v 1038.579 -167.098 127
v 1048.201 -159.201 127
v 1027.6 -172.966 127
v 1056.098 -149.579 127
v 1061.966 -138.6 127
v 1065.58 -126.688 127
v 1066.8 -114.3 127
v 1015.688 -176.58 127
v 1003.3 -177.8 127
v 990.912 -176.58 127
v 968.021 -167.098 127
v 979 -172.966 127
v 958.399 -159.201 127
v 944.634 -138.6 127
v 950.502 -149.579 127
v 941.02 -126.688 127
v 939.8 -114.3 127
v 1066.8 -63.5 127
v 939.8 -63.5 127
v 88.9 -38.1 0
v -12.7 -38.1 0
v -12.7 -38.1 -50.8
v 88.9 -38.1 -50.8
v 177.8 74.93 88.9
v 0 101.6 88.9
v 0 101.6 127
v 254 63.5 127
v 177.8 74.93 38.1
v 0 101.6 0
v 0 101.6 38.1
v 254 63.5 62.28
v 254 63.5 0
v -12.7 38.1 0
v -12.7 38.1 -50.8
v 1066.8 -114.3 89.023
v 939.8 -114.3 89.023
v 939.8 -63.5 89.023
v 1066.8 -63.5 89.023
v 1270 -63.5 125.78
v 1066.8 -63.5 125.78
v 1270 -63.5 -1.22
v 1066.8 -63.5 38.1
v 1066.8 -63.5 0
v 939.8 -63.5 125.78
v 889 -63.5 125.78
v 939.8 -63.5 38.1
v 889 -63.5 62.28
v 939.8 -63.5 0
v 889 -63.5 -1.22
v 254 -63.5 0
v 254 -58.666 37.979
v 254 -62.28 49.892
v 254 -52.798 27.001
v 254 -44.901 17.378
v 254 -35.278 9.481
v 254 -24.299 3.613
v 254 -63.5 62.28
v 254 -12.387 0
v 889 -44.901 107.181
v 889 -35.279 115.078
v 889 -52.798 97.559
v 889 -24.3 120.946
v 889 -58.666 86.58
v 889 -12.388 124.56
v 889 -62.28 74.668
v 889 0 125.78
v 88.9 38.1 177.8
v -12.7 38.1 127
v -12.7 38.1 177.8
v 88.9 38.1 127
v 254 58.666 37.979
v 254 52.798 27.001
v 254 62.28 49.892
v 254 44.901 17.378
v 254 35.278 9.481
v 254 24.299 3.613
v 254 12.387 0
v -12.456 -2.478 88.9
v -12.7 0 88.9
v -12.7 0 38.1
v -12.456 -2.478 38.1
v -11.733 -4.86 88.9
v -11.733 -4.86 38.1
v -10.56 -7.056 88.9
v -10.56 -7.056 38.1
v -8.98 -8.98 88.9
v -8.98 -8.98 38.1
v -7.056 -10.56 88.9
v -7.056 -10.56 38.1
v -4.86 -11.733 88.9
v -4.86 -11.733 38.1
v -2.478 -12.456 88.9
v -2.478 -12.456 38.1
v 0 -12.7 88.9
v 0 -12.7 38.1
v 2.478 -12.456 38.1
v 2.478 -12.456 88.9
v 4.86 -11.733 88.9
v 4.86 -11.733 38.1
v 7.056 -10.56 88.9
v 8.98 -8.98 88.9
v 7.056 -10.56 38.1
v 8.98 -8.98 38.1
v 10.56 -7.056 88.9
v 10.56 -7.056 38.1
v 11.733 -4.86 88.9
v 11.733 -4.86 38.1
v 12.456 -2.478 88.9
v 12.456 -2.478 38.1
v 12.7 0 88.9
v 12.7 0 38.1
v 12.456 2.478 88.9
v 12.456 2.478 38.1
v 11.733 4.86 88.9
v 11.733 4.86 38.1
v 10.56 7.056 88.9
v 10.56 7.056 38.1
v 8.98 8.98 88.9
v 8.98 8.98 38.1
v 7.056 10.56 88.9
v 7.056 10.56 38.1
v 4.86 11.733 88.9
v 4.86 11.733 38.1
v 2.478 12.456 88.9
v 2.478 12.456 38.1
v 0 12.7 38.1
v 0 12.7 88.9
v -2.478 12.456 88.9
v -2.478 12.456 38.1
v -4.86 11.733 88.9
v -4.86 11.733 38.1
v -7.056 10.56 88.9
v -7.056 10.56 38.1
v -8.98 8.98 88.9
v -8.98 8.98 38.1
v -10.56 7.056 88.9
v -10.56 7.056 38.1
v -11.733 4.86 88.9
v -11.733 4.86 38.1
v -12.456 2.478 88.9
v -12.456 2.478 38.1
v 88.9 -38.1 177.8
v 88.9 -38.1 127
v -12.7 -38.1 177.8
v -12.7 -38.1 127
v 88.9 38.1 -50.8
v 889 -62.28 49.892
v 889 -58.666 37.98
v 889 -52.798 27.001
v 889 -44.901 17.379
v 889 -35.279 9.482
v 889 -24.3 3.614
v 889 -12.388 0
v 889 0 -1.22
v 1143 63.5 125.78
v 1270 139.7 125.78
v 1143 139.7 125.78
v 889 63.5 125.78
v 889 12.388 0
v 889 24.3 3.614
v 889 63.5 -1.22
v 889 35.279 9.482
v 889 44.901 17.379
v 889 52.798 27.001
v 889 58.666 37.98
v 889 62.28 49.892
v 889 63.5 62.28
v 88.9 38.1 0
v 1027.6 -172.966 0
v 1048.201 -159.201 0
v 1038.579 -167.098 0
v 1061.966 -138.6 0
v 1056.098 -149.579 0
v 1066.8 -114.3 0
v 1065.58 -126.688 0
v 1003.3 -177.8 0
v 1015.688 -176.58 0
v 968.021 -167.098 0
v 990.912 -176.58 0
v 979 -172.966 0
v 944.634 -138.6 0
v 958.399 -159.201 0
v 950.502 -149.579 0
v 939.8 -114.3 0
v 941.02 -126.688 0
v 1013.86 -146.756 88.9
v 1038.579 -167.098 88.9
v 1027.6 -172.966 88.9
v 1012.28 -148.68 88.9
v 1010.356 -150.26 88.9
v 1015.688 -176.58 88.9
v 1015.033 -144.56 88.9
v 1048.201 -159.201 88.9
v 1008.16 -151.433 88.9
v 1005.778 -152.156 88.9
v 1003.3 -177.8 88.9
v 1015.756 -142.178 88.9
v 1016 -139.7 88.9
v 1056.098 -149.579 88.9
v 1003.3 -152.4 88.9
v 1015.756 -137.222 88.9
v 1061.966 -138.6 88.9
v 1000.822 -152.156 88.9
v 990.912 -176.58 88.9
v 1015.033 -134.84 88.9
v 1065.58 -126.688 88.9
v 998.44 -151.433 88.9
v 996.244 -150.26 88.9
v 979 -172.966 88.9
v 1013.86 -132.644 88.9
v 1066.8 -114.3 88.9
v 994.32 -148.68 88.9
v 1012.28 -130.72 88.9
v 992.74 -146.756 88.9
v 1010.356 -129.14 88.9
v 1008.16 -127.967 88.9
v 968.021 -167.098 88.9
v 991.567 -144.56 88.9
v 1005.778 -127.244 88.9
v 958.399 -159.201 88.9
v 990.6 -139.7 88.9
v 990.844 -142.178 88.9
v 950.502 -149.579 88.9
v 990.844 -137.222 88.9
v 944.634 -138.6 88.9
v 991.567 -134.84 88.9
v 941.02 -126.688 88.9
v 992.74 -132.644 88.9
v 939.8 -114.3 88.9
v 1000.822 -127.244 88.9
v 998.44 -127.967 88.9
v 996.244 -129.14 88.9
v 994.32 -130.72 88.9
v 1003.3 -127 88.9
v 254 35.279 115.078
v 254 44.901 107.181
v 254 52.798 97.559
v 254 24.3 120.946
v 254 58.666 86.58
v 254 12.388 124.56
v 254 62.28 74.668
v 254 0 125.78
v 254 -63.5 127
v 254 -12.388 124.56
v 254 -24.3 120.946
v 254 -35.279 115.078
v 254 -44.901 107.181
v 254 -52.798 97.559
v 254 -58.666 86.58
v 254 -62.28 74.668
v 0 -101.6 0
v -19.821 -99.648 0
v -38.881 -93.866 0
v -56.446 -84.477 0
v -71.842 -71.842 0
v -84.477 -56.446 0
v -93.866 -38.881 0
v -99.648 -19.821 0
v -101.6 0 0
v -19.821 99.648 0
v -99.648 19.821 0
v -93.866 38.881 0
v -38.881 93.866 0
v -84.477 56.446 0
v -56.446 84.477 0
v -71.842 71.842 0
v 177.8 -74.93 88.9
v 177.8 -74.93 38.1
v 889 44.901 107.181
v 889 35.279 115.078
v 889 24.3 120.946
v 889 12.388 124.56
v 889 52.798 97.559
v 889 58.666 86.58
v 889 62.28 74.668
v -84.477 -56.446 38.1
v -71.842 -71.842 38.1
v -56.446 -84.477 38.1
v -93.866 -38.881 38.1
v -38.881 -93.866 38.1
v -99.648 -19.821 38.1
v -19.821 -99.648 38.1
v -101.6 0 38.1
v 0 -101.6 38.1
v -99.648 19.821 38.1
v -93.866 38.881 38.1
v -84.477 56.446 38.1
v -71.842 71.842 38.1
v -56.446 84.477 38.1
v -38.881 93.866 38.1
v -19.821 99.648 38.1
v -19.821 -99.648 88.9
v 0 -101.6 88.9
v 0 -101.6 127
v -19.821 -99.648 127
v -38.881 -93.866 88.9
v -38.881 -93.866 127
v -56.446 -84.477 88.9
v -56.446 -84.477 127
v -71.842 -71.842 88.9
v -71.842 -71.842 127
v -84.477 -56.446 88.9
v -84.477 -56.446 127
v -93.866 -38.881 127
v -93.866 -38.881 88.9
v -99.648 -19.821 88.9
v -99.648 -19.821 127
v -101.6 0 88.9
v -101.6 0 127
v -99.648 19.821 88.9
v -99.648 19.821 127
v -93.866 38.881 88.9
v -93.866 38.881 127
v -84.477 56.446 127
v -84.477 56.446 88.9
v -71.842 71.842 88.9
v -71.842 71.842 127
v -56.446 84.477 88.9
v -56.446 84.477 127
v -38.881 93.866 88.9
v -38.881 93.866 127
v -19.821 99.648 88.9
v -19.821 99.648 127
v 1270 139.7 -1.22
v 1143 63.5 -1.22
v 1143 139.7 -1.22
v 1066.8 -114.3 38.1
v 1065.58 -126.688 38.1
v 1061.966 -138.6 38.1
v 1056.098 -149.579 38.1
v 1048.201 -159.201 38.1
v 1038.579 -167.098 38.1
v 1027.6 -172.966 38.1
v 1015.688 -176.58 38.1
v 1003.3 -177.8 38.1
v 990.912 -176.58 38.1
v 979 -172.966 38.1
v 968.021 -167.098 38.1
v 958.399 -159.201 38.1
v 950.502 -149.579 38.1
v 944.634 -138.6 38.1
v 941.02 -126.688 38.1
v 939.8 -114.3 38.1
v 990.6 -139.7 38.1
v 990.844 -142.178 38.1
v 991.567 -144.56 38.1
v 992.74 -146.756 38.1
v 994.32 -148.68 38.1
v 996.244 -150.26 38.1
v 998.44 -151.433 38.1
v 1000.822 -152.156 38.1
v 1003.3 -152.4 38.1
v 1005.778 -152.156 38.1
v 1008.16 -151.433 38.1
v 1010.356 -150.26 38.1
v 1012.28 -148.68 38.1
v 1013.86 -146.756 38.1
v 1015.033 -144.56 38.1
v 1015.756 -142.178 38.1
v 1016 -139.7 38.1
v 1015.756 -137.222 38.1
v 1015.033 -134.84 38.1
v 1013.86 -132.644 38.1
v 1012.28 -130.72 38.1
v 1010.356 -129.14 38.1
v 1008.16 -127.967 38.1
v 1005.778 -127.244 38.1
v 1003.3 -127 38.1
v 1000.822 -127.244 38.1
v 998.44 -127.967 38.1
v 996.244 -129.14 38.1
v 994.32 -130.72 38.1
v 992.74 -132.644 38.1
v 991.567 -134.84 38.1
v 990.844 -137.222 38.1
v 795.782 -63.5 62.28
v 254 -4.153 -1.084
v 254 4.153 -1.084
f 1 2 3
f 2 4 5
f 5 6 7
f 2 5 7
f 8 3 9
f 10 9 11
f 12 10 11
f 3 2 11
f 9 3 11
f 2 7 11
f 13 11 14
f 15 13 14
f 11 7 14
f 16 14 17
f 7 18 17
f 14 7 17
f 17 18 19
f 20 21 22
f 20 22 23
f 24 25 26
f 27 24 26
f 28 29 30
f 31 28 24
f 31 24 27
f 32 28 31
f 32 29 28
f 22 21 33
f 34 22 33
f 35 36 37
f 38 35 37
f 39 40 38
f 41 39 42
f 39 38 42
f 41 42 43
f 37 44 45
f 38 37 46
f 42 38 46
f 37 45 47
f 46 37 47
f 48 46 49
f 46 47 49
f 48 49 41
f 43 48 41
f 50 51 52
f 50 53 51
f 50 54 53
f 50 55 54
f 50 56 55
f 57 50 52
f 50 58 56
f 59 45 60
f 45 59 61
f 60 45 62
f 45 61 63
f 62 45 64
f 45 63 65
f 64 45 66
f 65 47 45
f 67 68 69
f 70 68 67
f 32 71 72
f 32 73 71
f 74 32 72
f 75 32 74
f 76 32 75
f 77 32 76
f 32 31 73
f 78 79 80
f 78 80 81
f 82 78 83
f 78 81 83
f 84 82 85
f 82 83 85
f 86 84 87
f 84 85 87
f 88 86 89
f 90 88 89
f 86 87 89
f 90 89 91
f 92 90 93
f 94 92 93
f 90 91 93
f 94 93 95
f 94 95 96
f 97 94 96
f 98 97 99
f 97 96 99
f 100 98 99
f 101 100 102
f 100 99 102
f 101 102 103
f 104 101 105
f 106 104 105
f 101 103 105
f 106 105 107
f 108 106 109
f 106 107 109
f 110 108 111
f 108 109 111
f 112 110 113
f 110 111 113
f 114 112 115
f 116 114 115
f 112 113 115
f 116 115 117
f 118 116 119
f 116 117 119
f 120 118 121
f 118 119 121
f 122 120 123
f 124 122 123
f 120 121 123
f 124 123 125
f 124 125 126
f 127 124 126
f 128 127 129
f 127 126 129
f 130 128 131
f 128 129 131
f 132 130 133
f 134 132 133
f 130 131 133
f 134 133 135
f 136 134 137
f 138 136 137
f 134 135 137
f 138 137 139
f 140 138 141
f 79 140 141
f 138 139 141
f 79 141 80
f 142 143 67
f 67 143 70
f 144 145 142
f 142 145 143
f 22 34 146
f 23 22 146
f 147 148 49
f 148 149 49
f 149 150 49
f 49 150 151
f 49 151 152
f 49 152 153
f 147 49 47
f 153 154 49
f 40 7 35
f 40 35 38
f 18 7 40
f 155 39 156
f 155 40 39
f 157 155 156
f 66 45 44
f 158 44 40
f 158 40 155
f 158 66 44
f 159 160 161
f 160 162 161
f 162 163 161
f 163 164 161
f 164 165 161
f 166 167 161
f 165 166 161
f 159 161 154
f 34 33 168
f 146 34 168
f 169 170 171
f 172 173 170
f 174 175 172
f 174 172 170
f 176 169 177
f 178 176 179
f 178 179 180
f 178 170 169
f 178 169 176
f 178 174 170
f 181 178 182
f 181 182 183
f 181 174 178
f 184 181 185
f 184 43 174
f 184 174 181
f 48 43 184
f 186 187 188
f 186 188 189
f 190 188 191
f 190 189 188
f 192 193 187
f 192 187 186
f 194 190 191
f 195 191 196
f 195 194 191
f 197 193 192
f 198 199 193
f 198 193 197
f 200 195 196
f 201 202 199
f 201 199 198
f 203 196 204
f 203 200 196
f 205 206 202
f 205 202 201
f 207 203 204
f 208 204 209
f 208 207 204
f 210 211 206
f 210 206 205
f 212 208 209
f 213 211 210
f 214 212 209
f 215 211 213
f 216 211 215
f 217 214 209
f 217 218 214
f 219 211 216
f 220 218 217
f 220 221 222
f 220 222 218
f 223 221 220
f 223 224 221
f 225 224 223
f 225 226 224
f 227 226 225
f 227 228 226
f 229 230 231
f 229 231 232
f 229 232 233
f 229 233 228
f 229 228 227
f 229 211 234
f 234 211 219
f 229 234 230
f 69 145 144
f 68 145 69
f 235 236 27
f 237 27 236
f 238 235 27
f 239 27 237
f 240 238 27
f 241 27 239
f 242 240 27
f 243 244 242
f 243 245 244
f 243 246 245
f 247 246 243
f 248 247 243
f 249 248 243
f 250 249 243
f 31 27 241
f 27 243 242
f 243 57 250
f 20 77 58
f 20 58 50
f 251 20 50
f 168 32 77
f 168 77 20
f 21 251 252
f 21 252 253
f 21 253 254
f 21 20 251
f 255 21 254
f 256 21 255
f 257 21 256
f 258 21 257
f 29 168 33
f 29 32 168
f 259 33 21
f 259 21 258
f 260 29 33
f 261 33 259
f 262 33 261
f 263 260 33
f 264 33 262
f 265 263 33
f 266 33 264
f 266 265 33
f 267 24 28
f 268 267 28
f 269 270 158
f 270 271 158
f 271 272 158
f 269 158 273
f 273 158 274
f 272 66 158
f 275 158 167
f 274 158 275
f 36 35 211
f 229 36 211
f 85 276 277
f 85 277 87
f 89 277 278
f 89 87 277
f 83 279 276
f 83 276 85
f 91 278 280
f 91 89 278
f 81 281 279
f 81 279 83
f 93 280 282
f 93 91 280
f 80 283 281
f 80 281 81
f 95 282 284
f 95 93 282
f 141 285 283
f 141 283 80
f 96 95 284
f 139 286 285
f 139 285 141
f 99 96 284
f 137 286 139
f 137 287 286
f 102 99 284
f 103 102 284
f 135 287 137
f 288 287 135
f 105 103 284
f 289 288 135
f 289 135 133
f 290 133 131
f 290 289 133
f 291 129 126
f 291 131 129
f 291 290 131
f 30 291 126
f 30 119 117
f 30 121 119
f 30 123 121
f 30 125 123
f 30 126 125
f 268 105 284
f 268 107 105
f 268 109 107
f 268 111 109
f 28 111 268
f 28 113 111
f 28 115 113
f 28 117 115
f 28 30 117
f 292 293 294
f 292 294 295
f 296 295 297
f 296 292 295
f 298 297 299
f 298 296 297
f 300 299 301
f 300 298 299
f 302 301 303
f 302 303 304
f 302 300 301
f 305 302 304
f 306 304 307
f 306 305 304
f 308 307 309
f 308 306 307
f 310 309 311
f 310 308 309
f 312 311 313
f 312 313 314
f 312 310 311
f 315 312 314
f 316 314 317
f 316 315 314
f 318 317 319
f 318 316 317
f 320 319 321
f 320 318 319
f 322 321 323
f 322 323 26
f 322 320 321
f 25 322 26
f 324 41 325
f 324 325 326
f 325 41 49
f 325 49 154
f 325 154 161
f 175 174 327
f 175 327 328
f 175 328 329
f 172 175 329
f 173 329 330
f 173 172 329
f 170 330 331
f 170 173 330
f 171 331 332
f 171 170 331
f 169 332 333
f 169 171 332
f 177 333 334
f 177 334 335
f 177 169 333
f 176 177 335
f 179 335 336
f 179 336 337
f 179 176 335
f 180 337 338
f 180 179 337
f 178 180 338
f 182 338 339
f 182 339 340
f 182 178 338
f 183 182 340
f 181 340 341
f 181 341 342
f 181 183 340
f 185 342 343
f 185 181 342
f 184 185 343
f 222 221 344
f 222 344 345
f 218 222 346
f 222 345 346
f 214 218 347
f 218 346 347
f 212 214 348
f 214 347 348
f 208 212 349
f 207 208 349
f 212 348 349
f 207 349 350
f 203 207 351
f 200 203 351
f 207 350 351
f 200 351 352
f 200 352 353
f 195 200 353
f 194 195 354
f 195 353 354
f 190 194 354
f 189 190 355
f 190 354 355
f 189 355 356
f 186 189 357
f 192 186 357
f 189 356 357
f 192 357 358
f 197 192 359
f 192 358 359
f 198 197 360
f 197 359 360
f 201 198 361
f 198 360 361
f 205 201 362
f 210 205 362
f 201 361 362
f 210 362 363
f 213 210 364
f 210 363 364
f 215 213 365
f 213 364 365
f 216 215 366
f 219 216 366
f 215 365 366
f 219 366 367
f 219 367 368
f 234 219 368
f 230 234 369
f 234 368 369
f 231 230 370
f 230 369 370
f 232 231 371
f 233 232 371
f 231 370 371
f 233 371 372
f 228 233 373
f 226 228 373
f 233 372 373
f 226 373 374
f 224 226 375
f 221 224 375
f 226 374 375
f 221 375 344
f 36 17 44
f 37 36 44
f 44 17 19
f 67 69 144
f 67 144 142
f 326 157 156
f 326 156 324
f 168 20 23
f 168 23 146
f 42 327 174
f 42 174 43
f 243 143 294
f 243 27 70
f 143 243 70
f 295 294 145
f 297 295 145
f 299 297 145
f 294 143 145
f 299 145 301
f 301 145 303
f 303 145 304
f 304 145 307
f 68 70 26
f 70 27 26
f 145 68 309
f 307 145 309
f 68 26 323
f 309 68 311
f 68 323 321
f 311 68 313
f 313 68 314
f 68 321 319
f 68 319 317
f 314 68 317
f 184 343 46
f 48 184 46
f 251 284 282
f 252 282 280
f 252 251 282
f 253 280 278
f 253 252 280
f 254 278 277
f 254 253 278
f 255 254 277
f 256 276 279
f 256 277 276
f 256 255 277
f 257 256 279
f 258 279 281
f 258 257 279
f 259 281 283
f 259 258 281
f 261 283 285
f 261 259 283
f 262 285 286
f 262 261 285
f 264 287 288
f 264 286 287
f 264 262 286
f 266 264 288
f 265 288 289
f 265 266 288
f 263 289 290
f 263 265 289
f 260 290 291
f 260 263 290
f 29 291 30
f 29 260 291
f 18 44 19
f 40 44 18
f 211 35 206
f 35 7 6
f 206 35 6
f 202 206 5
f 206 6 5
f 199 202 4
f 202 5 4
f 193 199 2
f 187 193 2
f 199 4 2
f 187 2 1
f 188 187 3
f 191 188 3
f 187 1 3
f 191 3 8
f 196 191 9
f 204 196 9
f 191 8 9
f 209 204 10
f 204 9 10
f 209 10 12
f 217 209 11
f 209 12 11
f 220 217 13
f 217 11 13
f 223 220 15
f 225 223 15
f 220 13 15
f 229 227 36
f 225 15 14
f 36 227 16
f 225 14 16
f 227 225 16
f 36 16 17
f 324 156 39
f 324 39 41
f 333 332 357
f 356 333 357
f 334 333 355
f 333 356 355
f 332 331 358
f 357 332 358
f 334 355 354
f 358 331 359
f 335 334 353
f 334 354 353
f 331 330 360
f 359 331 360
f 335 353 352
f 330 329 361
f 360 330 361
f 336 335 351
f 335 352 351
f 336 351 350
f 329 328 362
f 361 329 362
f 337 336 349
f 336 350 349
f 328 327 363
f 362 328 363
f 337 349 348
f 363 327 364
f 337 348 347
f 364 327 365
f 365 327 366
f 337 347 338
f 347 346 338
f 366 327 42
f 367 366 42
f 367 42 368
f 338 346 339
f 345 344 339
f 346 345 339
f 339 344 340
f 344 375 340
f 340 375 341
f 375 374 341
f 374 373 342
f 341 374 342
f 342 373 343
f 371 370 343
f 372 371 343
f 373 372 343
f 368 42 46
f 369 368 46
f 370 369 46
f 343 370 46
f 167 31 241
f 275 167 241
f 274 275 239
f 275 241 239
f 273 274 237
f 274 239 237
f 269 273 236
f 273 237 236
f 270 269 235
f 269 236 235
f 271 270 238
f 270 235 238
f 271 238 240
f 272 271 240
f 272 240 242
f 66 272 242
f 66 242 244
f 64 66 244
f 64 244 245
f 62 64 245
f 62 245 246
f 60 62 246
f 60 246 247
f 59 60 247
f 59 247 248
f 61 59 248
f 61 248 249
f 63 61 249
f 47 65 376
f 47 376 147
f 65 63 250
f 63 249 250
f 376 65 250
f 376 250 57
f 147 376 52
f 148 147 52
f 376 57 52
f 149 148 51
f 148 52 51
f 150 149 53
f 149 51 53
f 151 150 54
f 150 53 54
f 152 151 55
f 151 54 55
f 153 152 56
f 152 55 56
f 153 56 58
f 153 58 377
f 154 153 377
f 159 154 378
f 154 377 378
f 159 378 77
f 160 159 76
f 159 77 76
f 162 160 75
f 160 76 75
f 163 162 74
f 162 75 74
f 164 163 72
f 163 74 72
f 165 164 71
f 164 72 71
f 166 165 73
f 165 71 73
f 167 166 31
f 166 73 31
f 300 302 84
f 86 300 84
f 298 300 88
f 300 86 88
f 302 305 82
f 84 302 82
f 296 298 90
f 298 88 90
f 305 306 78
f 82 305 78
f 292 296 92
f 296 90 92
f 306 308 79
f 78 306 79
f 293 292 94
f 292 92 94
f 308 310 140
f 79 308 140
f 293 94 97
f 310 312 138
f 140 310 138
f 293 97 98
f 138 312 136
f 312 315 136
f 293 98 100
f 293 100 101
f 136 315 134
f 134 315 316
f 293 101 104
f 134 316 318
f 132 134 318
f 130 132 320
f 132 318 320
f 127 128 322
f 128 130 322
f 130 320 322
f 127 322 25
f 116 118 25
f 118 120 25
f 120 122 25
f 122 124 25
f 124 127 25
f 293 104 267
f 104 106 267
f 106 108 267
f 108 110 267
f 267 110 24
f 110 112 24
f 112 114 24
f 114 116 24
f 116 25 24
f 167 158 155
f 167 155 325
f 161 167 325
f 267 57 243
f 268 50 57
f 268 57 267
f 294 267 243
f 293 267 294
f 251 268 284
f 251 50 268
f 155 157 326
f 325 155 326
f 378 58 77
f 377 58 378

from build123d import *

# Parameters (mm, degrees)
BOSS_EXTRUDE2_DEPTH  = 127
SKETCH11_W           = 279.4
SKETCH11_H           = 50.8
CUT_EXTRUDE1_DEPTH   = 350.192267956
SKETCH12_R           = 63.5
BOSS_EXTRUDE3_DEPTH  = 635
SKETCH13_W           = 101.6
SKETCH13_H           = 76.2
BOSS_EXTRUDE4_DEPTH  = 50.8
SKETCH14_W           = 127
SKETCH14_H           = 127
BOSS_EXTRUDE6_DEPTH  = 254
SKETCH15_W           = 127
SKETCH15_H           = 203.2
BOSS_EXTRUDE7_DEPTH  = 127
SKETCH16_W           = 127
SKETCH16_H           = 50.8
BOSS_EXTRUDE9_DEPTH  = 63.5
BOSS_EXTRUDE10_DEPTH = 38.1
SKETCH21_R           = 12.7
BOSS_EXTRUDE11_DEPTH = 50.8
SKETCH22_R           = 12.7
BOSS_EXTRUDE12_DEPTH = 50.8
SKETCH24_W           = 50.922560847
SKETCH24_H           = 50.8
CUT_EXTRUDE2_DEPTH   = 271.018


with BuildPart() as part:
    # Sketch9 → Boss-Extrude2 (new body)
    with BuildSketch(Plane.XY):
        with BuildLine():
            Line((0, 101.6), (254, 63.5))
            Line((254, 63.5), (254, 0))
            Line((254, 0), (254, -63.5))
            Line((254, -63.5), (0, -101.6))
            ThreePointArc((0, -101.6), (-101.6, 0), (0, 101.6))
        make_face()
    extrude(amount=BOSS_EXTRUDE2_DEPTH)

    # Sketch11 → Cut-Extrude1 (cut, through all)
    with BuildSketch(Plane(origin=(0, 101.6, 0), x_dir=(1, 0, 0), z_dir=(0, 1, 0))):
        with Locations((38.1, -63.5)):
            Rectangle(SKETCH11_W, SKETCH11_H)
    extrude(amount=-CUT_EXTRUDE1_DEPTH, mode=Mode.SUBTRACT)

    # Sketch12 → Boss-Extrude3 (add)
    with BuildSketch(Plane(origin=(254, 0, 0), x_dir=(0, 0, -1), z_dir=(1, 0, 0))):
        with Locations(Location((-62.280099892, 0, 0), (0, 0, 90))):
            Circle(SKETCH12_R)
    extrude(amount=BOSS_EXTRUDE3_DEPTH)

    # Sketch13 → Boss-Extrude4 (add)
    with BuildSketch(Plane.XY.offset(127)):
        with Locations((38.1, 0)):
            Rectangle(SKETCH13_W, SKETCH13_H)
    boss_extrude4 = extrude(amount=BOSS_EXTRUDE4_DEPTH)

    # Mirror1: Boss-Extrude4 across plane
    add(boss_extrude4.mirror(Plane.XY.offset(63.5)))

    # Sketch14 → Boss-Extrude6 (add)
    with BuildSketch(Plane(origin=(889, 0, 0), x_dir=(0, 0, -1), z_dir=(1, 0, 0))):
        with Locations((-62.280099892, 0)):
            Rectangle(SKETCH14_W, SKETCH14_H)
    extrude(amount=BOSS_EXTRUDE6_DEPTH)

    # Sketch15 → Boss-Extrude7 (add)
    with BuildSketch(Plane(origin=(1143, 0, 0), x_dir=(0, 0, -1), z_dir=(1, 0, 0))):
        with Locations((-62.280099892, 38.1)):
            Rectangle(SKETCH15_W, SKETCH15_H)
    extrude(amount=BOSS_EXTRUDE7_DEPTH)

    # Sketch16 → Boss-Extrude9 (add)
    with BuildSketch(Plane.XY.offset(63.5)):
        with Locations((1003.3, -88.9)):
            Rectangle(SKETCH16_W, SKETCH16_H)
    boss_extrude9 = extrude(amount=BOSS_EXTRUDE9_DEPTH)

    # Sketch20 → Boss-Extrude10 (add)
    with BuildSketch(Plane.XY.offset(127)):
        with BuildLine():
            Line((939.8, -114.3), (1066.8, -114.3))
            ThreePointArc((1066.8, -114.3), (1003.3, -177.8), (939.8, -114.3))
        make_face()
    boss_extrude10 = extrude(amount=-BOSS_EXTRUDE10_DEPTH)

    # Mirror2: Boss-Extrude9, Boss-Extrude10 across plane
    add(boss_extrude9.mirror(Plane.XY.offset(63.5)))
    add(boss_extrude10.mirror(Plane.XY.offset(63.5)))

    # Sketch21 → Boss-Extrude11 (add)
    with BuildSketch(Plane.XY.offset(38.1)):
        with Locations(Location((0, 0, 0), (0, 0, 180))):
            Circle(SKETCH21_R)
    extrude(amount=BOSS_EXTRUDE11_DEPTH)

    # Sketch22 → Boss-Extrude12 (add)
    with BuildSketch(Plane.XY.offset(38.1)):
        with Locations(Location((1003.3, -139.7, 0), (0, 0, 180))):
            Circle(SKETCH22_R)
    extrude(amount=BOSS_EXTRUDE12_DEPTH)

    # Sketch24 → Cut-Extrude2 (cut)
    with BuildSketch(Plane(origin=(1066.8, 0, 0), x_dir=(0, 0, -1), z_dir=(1, 0, 0))):
        with Locations((-63.561280424, -88.9)):
            Rectangle(SKETCH24_W, SKETCH24_H)
    extrude(amount=-CUT_EXTRUDE2_DEPTH, mode=Mode.SUBTRACT)


solid = part.part
